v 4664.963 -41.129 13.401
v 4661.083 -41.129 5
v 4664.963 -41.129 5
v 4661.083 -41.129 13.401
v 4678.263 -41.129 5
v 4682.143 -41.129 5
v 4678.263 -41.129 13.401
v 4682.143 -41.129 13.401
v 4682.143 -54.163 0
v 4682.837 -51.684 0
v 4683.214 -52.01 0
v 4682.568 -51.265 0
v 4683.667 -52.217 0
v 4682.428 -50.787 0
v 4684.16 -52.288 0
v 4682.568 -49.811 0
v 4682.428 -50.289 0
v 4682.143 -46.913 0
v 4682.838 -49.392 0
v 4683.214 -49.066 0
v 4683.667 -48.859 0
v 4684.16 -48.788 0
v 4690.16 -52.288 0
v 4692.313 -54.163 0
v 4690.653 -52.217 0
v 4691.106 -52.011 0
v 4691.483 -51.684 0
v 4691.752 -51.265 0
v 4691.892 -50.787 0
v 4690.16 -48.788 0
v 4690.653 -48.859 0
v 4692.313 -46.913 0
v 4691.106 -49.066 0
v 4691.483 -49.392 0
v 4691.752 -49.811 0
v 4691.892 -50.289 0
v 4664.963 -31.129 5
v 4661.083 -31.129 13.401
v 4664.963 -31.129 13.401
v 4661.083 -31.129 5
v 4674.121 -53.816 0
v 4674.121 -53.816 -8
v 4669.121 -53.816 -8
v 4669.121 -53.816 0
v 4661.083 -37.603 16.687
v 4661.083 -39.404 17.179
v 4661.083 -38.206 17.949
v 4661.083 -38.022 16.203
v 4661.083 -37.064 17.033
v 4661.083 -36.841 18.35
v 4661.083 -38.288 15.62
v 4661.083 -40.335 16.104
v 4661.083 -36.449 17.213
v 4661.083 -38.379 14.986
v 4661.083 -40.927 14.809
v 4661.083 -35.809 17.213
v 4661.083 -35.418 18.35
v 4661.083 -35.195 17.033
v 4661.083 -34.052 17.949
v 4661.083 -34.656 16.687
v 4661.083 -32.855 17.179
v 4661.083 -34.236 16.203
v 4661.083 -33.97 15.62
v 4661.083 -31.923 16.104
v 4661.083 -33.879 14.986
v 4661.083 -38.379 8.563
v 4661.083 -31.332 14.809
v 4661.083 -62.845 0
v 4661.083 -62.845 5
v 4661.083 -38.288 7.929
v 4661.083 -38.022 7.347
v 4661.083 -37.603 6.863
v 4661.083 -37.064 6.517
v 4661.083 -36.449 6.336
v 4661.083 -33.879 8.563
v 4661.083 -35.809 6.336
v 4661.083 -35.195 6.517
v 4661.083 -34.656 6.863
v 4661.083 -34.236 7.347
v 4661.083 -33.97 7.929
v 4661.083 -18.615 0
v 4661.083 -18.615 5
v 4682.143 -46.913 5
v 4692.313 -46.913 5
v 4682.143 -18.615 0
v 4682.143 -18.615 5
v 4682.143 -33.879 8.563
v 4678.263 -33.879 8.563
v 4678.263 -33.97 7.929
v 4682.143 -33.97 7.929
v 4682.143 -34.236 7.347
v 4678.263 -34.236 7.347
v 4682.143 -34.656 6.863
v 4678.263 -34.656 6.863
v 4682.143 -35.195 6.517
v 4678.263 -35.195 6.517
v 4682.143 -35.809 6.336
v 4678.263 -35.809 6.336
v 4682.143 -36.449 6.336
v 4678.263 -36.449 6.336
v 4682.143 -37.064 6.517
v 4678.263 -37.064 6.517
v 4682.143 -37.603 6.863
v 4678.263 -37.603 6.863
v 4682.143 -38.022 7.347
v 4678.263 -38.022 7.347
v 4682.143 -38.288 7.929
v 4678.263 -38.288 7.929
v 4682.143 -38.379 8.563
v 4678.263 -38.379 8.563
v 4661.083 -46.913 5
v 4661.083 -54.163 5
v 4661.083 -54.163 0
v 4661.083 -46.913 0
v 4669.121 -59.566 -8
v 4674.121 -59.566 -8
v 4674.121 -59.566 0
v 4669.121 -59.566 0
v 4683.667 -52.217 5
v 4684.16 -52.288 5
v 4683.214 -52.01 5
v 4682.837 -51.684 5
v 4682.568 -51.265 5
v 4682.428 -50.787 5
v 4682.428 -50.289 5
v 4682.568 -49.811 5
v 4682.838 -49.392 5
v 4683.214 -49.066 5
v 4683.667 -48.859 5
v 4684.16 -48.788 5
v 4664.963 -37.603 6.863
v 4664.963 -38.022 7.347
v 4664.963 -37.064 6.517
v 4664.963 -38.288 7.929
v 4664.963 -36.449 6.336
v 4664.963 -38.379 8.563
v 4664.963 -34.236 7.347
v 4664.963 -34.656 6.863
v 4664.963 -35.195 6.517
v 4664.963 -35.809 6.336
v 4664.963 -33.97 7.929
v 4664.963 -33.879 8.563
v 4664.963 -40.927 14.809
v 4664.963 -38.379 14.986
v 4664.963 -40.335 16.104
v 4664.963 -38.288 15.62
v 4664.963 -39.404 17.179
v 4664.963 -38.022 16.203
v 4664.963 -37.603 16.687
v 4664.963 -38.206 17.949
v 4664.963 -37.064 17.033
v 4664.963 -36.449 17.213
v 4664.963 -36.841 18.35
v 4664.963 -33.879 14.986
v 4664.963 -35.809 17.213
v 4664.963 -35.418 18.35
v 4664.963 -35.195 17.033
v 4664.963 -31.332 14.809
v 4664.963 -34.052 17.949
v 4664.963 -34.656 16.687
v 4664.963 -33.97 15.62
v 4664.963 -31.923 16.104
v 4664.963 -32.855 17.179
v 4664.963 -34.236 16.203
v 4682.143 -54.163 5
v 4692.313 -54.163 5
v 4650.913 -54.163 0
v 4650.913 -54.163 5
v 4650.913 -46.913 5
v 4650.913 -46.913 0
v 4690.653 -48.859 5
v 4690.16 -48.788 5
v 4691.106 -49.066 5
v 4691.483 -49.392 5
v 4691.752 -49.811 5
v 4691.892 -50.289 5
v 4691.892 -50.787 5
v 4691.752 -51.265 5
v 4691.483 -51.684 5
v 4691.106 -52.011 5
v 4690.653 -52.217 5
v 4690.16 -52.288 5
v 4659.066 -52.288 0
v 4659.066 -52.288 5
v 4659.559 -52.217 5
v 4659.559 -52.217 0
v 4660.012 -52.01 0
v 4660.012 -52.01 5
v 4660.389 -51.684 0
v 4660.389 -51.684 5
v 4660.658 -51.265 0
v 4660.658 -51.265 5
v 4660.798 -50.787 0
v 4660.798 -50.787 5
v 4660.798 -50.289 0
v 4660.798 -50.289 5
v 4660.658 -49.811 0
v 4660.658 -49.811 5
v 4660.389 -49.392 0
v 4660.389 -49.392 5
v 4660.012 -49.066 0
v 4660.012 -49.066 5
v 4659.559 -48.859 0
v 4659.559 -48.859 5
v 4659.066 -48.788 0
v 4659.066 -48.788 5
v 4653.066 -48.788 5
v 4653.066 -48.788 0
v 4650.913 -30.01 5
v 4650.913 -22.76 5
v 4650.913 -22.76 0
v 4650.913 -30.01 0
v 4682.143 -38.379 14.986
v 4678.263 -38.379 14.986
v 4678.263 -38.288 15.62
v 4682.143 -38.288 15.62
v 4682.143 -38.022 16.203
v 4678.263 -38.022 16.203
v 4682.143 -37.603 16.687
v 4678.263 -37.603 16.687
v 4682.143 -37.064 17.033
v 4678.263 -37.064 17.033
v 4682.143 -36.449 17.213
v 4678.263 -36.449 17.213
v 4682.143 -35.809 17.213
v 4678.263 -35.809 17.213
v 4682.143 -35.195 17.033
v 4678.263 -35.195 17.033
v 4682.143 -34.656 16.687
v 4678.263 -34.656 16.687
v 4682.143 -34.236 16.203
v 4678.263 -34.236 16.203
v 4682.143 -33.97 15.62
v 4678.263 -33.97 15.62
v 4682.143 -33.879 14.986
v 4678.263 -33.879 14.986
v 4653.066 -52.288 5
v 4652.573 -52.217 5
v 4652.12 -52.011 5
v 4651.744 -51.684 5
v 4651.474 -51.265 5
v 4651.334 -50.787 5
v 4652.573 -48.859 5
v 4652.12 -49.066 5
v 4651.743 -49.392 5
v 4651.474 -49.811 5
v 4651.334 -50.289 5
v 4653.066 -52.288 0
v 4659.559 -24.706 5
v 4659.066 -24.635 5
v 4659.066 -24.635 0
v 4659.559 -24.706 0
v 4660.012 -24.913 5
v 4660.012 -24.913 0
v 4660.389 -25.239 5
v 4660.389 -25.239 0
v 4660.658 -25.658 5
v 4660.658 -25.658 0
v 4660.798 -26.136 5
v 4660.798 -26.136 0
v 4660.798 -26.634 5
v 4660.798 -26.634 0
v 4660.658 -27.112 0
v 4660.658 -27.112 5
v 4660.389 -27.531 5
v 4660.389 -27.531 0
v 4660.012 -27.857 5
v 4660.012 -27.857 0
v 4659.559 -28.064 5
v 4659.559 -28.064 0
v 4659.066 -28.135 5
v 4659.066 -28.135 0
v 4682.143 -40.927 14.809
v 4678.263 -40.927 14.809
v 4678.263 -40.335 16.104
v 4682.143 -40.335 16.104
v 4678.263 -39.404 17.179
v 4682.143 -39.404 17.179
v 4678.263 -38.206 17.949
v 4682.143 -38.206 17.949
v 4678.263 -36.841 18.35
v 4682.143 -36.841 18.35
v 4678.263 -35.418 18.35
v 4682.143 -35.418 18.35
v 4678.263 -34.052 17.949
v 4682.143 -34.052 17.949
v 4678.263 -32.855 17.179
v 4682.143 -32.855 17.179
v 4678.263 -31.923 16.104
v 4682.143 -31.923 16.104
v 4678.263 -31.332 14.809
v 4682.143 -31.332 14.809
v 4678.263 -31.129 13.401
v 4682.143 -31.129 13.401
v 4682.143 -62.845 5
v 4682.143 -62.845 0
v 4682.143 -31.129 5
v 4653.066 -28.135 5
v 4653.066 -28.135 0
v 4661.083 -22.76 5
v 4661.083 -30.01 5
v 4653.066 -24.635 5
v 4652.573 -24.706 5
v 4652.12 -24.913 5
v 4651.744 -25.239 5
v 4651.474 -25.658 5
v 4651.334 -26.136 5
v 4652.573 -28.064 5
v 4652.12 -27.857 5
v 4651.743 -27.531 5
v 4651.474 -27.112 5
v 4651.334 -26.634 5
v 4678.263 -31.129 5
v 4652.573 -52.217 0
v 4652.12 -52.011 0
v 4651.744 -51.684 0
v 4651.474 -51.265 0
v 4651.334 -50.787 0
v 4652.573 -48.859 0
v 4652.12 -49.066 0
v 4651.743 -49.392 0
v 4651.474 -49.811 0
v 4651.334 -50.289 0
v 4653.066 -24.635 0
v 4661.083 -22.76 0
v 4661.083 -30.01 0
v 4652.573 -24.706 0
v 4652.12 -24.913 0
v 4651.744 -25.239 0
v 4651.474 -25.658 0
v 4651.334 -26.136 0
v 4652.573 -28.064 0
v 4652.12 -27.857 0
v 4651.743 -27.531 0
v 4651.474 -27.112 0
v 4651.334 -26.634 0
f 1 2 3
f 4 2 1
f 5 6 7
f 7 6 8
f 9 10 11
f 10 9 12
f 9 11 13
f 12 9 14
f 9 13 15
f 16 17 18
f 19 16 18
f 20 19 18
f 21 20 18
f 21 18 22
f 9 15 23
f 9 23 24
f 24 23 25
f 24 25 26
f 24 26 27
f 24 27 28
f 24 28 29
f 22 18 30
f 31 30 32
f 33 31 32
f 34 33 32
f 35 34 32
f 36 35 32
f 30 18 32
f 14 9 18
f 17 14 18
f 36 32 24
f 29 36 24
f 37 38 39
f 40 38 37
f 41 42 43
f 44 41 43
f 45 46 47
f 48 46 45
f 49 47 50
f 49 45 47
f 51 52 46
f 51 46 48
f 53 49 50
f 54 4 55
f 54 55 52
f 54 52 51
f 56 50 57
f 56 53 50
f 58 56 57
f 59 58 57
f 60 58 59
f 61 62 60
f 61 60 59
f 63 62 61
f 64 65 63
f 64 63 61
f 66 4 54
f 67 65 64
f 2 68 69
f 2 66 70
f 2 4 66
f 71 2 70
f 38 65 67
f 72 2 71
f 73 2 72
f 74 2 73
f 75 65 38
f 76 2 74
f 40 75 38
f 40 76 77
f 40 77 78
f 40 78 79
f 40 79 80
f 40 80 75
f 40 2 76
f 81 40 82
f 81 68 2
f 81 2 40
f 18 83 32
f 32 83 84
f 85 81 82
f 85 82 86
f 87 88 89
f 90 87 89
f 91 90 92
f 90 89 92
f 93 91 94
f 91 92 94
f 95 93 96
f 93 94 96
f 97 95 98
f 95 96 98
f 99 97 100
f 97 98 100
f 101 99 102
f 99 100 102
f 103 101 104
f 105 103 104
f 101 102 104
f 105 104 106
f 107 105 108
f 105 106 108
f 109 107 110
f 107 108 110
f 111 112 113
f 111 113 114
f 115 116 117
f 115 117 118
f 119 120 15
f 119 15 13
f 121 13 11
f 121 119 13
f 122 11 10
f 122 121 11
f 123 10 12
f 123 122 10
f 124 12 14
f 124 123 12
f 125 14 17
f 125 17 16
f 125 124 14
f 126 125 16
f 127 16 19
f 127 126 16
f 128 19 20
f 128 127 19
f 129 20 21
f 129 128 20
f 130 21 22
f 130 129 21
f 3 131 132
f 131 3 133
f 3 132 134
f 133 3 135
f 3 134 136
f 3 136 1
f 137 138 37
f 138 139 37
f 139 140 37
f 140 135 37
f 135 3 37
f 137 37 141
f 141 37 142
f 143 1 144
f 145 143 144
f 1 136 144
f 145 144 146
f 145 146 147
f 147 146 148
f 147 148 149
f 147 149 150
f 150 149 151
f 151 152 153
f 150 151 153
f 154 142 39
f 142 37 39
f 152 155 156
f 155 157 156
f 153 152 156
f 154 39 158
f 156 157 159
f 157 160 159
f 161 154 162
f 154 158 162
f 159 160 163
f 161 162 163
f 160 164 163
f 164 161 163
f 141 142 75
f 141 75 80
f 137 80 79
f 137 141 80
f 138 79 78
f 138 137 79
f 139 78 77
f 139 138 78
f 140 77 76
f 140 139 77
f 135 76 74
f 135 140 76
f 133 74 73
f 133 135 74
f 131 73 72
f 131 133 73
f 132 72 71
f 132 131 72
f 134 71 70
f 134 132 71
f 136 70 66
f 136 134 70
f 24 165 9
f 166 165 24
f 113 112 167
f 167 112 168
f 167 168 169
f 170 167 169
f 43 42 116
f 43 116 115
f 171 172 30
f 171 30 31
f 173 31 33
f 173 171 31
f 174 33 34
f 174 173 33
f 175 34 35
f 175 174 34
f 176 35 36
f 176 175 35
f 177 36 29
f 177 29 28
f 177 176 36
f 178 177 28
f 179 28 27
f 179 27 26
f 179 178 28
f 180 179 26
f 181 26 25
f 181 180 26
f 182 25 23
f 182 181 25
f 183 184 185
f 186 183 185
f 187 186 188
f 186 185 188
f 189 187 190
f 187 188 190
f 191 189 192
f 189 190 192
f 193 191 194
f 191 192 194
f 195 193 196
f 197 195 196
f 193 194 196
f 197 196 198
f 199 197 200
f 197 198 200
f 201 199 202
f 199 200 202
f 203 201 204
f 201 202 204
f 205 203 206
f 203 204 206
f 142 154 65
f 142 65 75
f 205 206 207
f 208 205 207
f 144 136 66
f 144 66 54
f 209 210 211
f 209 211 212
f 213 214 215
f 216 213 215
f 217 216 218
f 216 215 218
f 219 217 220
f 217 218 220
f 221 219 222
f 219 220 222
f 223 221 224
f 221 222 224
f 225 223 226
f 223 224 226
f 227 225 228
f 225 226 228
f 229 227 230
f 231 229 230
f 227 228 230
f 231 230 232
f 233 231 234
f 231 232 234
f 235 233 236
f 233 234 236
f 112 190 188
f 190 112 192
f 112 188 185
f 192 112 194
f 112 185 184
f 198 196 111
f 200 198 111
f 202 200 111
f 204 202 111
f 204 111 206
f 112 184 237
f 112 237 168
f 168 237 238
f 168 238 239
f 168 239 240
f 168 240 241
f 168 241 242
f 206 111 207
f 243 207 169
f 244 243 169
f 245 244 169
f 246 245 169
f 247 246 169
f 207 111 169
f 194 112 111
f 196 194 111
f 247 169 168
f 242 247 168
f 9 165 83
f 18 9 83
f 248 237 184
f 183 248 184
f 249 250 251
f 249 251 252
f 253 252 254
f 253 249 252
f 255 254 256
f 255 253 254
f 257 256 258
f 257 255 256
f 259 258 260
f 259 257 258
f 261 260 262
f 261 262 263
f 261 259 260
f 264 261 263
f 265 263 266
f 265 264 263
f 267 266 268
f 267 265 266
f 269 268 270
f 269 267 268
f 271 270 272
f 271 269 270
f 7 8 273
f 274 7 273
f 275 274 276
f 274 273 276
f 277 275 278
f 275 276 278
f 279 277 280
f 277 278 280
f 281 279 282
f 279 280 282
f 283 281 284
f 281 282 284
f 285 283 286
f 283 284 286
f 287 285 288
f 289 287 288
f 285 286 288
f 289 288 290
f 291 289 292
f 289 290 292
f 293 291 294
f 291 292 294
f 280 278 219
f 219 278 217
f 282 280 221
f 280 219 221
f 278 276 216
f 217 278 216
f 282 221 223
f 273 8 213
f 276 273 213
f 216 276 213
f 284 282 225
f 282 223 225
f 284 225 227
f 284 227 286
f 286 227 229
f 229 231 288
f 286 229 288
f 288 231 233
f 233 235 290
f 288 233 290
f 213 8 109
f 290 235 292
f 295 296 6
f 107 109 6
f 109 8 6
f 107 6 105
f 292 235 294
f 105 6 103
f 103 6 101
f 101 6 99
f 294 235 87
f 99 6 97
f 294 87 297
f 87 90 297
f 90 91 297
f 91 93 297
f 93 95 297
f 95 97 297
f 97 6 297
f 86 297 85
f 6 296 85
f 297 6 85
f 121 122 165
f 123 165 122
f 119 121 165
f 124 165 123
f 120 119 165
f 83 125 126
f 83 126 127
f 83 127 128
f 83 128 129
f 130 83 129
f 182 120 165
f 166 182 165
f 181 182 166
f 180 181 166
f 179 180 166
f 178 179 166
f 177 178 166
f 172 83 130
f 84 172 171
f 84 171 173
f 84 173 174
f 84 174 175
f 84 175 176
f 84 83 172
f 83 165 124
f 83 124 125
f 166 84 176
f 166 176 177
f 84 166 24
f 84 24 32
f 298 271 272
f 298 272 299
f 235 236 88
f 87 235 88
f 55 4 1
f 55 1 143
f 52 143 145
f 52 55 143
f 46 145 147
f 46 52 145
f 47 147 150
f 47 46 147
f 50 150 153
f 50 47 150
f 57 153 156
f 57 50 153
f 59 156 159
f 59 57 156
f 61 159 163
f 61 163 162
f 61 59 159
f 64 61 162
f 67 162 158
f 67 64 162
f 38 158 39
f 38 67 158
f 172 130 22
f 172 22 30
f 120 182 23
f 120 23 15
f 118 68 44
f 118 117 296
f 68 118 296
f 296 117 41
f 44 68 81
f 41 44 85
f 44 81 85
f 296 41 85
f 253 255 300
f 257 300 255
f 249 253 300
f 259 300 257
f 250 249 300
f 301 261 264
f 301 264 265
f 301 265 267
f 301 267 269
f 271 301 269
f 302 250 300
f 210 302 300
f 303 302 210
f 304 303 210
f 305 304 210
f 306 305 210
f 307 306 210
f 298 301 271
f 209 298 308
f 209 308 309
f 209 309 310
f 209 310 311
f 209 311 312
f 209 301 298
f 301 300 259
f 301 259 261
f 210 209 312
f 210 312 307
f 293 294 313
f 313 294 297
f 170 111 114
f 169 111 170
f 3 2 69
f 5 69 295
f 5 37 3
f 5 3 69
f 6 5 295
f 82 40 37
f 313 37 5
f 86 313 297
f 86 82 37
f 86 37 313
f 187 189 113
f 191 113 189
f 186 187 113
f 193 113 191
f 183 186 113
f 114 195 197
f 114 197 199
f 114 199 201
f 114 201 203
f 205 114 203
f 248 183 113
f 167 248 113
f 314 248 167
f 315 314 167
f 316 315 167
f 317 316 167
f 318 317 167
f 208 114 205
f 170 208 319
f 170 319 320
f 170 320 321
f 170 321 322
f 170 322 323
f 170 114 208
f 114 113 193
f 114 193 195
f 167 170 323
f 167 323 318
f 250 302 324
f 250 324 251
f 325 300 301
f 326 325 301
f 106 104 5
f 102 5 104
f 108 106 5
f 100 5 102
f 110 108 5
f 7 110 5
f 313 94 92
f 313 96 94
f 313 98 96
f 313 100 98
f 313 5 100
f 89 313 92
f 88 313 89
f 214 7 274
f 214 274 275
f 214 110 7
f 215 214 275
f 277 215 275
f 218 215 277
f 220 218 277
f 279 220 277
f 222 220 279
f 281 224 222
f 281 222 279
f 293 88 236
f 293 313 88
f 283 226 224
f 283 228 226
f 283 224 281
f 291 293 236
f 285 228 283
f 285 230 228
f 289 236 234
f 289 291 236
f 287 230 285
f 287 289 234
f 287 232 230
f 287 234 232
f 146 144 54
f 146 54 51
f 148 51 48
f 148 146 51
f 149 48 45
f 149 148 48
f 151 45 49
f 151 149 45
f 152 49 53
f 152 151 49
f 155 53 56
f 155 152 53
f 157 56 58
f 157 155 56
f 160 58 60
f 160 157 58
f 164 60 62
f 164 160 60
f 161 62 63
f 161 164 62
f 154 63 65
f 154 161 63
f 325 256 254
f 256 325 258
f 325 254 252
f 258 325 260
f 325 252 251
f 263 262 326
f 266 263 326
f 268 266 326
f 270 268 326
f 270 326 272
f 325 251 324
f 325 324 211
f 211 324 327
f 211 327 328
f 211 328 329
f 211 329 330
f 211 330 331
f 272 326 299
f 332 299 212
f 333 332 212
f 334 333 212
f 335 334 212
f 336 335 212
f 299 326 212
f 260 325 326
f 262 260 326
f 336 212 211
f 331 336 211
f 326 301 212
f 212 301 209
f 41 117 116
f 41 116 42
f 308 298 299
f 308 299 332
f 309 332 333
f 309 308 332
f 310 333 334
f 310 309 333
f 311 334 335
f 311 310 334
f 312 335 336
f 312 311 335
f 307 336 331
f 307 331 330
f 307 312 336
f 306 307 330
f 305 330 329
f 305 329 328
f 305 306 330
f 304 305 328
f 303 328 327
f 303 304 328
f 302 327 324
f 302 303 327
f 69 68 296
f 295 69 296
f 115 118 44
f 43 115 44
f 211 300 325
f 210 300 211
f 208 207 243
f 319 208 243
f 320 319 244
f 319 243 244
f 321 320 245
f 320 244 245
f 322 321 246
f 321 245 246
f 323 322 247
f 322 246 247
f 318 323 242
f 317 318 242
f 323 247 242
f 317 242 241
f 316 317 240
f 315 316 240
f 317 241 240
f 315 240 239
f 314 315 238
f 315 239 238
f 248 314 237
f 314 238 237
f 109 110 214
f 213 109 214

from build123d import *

# Parameters (mm, degrees)
SKETCH1_W           = 21.060518524
SKETCH1_H           = 44.229680595
BOSS_EXTRUDE1_DEPTH = 5
SKETCH2_W           = 5
SKETCH2_H           = 5.75
BOSS_EXTRUDE2_DEPTH = 8
BOSS_EXTRUDE3_DEPTH = 3.8801
CUT_EXTRUDE1_DEPTH  = 8
SKETCH6_W           = 10.169740738
SKETCH6_H           = 7.25
BOSS_EXTRUDE4_DEPTH = 5
SKETCH11_W          = 10.169740738
SKETCH11_H          = 7.25
CUT_EXTRUDE2_DEPTH  = 5


with BuildPart() as part:
    # Sketch1 → Boss-Extrude1 (new body)
    with BuildSketch(Plane.XY):
        with Locations((4671.613089989, -40.729662913)):
            Rectangle(SKETCH1_W, SKETCH1_H)
    extrude(amount=BOSS_EXTRUDE1_DEPTH)

    # Sketch2 → Boss-Extrude2 (add)
    with BuildSketch(Plane(origin=(0, 0, 0), x_dir=(-1, 0, 0), z_dir=(0, 0, -1))):
        with Locations((-4671.621214697, -56.691306655)):
            Rectangle(SKETCH2_W, SKETCH2_H)
    extrude(amount=BOSS_EXTRUDE2_DEPTH)

    # Sketch4 → Boss-Extrude3 (add)
    with BuildSketch(Plane.ZY.offset(-4661.082830727)):
        with BuildLine():
            Line((13.400549781, -31.129223835), (5, -31.129223835))
            Line((5, -31.129223835), (5, -41.129223835))
            Line((5, -41.129223835), (13.400549781, -41.129223835))
            ThreePointArc((13.400549781, -41.129223835), (18.400549781, -36.129223835), (13.400549781, -31.129223835))
        make_face()
    boss_extrude3 = extrude(amount=-BOSS_EXTRUDE3_DEPTH)

    # Sketch5 → Cut-Extrude1 (cut)
    with BuildSketch(Plane(origin=(4664.962930727, 0, 0), x_dir=(0, 0, -1), z_dir=(1, 0, 0))):
        with BuildLine():
            Line((-14.986353963, -33.879223835), (-8.563353453, -33.879223835))
            ThreePointArc((-8.563353453, -33.879223835), (-6.313353453, -36.129223835), (-8.563353453, -38.379223835))
            Line((-8.563353453, -38.379223835), (-14.986353963, -38.379223835))
            ThreePointArc((-14.986353963, -38.379223835), (-17.236353963, -36.129223835), (-14.986353963, -33.879223835))
        make_face()
    cut_extrude1 = extrude(amount=-CUT_EXTRUDE1_DEPTH, mode=Mode.SUBTRACT)

    # Mirror2: Boss-Extrude3, Cut-Extrude1 across plane
    add(boss_extrude3.mirror(Plane.ZY.offset(-4671.613089989)))
    add(cut_extrude1.mirror(Plane.ZY.offset(-4671.613089989)), mode=Mode.SUBTRACT)


with BuildPart() as body_2:
    # Sketch6 → Boss-Extrude4 (new body)
    with BuildSketch(Plane.XY.offset(5)):
        with Locations((4687.22821962, -50.538110101)):
            Rectangle(SKETCH6_W, SKETCH6_H)
        with BuildLine():
            Line((4690.160013161, -52.288360766), (4684.160013167, -52.288110099))
            ThreePointArc((4684.160013167, -52.288110099), (4682.410086279, -50.53803699), (4684.160159389, -48.788110102))
            Line((4684.160159389, -48.788110102), (4690.160159384, -48.788360769))
            ThreePointArc((4690.160159384, -48.788360769), (4691.910086271, -50.538433879), (4690.160013161, -52.288360766))
        make_face(mode=Mode.SUBTRACT)
    extrude(amount=-BOSS_EXTRUDE4_DEPTH)


with BuildPart() as body_3:
    # Mirror3: mirrored copy
    add(body_2.part.mirror(Plane.ZY.offset(-4671.613089989)))


with BuildPart() as body_4:
    # Mirror4: mirrored copy
    add(body_3.part.mirror(Plane(origin=(0, -38.461673776, 0), x_dir=(0, 0, 1), z_dir=(0, -1, 0))))


with BuildPart() as body_5:
    # Mirror4 2: mirrored copy
    add(body_2.part.mirror(Plane(origin=(0, -38.461673776, 0), x_dir=(0, 0, 1), z_dir=(0, -1, 0))))

    # Sketch11 → Cut-Extrude2 (cut)
    with BuildSketch(Plane.XY.offset(5)):
        with Locations((4687.22821962, -26.385237452)):
            Rectangle(SKETCH11_W, SKETCH11_H)
    extrude(amount=-CUT_EXTRUDE2_DEPTH, mode=Mode.SUBTRACT)


solid = Compound([part.part, body_2.part, body_3.part, body_4.part])
